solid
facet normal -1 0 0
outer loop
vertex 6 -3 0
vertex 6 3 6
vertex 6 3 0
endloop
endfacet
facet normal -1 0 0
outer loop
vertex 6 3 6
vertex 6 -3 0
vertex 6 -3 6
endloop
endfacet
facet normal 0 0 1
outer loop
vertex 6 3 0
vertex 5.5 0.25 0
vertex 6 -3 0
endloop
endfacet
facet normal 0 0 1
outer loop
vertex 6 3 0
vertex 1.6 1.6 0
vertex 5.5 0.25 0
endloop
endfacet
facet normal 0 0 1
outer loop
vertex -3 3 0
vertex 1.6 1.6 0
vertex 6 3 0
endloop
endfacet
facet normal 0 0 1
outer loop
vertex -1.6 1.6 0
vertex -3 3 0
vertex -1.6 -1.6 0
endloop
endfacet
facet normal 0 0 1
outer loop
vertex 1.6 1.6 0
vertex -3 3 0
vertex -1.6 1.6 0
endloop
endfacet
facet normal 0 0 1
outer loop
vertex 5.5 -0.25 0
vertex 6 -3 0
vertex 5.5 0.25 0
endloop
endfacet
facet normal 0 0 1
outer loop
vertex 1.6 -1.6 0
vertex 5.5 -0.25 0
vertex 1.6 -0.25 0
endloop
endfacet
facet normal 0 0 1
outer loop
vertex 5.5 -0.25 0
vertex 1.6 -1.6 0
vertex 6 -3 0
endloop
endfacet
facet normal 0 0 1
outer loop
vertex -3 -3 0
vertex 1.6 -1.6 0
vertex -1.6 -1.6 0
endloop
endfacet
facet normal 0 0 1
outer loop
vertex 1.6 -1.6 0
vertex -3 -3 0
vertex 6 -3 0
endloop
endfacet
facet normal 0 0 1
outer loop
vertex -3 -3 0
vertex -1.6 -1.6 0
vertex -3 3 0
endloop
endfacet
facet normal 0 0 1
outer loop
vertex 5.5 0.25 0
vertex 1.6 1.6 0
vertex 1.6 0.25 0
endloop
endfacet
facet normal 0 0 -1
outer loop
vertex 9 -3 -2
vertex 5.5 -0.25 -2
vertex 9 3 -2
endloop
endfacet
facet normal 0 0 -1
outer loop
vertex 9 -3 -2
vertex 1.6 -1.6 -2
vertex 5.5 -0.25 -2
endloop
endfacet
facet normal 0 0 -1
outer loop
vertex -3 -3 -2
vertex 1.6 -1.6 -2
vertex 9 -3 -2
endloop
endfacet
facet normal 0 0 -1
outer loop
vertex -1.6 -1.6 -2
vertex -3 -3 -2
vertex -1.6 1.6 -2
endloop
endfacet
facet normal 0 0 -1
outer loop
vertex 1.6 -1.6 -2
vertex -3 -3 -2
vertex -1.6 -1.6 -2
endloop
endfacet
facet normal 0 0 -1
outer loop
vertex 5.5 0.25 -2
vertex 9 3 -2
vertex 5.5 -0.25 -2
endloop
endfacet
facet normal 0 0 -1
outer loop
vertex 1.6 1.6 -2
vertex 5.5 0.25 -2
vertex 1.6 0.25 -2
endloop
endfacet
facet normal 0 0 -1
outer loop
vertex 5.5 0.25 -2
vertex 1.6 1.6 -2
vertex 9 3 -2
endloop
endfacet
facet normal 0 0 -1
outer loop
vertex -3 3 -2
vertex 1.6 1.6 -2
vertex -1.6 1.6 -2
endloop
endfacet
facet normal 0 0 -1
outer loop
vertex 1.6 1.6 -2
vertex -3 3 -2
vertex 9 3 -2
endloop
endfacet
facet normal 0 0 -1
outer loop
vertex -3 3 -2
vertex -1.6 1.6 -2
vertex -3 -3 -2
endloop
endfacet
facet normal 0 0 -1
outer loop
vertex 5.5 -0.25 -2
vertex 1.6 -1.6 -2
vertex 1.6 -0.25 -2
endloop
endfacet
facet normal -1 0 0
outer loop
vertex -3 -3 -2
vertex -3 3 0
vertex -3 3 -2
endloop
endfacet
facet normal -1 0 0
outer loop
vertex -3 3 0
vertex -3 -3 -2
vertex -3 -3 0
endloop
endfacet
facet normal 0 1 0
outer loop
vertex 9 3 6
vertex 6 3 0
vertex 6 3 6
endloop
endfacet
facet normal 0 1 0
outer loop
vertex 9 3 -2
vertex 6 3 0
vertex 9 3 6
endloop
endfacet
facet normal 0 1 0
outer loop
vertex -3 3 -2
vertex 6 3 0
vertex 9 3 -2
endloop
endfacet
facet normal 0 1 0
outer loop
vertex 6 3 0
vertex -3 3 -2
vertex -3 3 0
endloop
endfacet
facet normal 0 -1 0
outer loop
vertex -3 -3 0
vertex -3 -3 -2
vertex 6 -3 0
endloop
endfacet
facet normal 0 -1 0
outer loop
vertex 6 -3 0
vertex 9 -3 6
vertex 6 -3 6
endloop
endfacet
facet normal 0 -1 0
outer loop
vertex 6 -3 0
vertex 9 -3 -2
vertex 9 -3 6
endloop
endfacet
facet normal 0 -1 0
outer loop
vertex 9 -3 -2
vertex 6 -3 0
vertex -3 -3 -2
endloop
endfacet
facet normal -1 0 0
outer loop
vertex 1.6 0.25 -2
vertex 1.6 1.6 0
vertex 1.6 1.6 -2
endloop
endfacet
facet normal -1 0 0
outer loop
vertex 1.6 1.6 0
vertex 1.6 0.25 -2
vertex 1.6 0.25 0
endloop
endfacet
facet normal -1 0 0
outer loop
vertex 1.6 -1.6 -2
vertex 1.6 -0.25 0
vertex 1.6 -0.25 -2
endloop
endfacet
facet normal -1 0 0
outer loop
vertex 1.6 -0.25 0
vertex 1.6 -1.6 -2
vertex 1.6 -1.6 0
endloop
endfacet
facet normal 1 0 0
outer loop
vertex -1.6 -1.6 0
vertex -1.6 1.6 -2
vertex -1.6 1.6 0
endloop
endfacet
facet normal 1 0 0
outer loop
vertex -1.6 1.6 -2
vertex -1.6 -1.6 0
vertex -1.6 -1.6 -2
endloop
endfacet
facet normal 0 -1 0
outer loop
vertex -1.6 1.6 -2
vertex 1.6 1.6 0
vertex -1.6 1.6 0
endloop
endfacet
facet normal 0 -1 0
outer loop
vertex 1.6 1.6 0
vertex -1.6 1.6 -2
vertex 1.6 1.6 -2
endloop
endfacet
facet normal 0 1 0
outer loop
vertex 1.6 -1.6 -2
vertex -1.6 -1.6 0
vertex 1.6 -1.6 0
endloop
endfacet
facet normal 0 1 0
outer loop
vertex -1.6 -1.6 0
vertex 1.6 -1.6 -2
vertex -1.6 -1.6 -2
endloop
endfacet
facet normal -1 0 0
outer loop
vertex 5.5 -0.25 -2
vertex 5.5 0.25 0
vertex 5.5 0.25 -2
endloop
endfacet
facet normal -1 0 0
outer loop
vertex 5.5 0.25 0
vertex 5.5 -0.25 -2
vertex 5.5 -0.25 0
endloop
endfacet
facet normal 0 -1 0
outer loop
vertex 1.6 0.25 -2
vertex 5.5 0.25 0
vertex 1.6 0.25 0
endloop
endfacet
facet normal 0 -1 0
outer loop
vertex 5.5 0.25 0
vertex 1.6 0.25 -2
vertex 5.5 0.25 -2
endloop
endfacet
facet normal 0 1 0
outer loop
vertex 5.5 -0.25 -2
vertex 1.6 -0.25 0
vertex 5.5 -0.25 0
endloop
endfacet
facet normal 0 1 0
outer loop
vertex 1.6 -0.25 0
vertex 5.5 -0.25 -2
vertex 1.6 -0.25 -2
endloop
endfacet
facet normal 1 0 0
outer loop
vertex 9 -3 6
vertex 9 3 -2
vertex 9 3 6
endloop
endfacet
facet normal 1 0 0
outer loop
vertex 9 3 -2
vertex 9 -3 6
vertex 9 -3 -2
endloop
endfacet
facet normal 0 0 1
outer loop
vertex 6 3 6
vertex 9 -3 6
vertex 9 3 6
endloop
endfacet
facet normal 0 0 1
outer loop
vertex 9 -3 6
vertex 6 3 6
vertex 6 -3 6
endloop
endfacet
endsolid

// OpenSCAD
difference(){
	translate([-3,-3,-2])cube([9,6,2]);
	cube([3.2,3.2,10],center=true);
	translate([0,-.25,-3])cube([5.5,.5,10]);
}
translate([6,-3,-2])cube([3,6,8]);
